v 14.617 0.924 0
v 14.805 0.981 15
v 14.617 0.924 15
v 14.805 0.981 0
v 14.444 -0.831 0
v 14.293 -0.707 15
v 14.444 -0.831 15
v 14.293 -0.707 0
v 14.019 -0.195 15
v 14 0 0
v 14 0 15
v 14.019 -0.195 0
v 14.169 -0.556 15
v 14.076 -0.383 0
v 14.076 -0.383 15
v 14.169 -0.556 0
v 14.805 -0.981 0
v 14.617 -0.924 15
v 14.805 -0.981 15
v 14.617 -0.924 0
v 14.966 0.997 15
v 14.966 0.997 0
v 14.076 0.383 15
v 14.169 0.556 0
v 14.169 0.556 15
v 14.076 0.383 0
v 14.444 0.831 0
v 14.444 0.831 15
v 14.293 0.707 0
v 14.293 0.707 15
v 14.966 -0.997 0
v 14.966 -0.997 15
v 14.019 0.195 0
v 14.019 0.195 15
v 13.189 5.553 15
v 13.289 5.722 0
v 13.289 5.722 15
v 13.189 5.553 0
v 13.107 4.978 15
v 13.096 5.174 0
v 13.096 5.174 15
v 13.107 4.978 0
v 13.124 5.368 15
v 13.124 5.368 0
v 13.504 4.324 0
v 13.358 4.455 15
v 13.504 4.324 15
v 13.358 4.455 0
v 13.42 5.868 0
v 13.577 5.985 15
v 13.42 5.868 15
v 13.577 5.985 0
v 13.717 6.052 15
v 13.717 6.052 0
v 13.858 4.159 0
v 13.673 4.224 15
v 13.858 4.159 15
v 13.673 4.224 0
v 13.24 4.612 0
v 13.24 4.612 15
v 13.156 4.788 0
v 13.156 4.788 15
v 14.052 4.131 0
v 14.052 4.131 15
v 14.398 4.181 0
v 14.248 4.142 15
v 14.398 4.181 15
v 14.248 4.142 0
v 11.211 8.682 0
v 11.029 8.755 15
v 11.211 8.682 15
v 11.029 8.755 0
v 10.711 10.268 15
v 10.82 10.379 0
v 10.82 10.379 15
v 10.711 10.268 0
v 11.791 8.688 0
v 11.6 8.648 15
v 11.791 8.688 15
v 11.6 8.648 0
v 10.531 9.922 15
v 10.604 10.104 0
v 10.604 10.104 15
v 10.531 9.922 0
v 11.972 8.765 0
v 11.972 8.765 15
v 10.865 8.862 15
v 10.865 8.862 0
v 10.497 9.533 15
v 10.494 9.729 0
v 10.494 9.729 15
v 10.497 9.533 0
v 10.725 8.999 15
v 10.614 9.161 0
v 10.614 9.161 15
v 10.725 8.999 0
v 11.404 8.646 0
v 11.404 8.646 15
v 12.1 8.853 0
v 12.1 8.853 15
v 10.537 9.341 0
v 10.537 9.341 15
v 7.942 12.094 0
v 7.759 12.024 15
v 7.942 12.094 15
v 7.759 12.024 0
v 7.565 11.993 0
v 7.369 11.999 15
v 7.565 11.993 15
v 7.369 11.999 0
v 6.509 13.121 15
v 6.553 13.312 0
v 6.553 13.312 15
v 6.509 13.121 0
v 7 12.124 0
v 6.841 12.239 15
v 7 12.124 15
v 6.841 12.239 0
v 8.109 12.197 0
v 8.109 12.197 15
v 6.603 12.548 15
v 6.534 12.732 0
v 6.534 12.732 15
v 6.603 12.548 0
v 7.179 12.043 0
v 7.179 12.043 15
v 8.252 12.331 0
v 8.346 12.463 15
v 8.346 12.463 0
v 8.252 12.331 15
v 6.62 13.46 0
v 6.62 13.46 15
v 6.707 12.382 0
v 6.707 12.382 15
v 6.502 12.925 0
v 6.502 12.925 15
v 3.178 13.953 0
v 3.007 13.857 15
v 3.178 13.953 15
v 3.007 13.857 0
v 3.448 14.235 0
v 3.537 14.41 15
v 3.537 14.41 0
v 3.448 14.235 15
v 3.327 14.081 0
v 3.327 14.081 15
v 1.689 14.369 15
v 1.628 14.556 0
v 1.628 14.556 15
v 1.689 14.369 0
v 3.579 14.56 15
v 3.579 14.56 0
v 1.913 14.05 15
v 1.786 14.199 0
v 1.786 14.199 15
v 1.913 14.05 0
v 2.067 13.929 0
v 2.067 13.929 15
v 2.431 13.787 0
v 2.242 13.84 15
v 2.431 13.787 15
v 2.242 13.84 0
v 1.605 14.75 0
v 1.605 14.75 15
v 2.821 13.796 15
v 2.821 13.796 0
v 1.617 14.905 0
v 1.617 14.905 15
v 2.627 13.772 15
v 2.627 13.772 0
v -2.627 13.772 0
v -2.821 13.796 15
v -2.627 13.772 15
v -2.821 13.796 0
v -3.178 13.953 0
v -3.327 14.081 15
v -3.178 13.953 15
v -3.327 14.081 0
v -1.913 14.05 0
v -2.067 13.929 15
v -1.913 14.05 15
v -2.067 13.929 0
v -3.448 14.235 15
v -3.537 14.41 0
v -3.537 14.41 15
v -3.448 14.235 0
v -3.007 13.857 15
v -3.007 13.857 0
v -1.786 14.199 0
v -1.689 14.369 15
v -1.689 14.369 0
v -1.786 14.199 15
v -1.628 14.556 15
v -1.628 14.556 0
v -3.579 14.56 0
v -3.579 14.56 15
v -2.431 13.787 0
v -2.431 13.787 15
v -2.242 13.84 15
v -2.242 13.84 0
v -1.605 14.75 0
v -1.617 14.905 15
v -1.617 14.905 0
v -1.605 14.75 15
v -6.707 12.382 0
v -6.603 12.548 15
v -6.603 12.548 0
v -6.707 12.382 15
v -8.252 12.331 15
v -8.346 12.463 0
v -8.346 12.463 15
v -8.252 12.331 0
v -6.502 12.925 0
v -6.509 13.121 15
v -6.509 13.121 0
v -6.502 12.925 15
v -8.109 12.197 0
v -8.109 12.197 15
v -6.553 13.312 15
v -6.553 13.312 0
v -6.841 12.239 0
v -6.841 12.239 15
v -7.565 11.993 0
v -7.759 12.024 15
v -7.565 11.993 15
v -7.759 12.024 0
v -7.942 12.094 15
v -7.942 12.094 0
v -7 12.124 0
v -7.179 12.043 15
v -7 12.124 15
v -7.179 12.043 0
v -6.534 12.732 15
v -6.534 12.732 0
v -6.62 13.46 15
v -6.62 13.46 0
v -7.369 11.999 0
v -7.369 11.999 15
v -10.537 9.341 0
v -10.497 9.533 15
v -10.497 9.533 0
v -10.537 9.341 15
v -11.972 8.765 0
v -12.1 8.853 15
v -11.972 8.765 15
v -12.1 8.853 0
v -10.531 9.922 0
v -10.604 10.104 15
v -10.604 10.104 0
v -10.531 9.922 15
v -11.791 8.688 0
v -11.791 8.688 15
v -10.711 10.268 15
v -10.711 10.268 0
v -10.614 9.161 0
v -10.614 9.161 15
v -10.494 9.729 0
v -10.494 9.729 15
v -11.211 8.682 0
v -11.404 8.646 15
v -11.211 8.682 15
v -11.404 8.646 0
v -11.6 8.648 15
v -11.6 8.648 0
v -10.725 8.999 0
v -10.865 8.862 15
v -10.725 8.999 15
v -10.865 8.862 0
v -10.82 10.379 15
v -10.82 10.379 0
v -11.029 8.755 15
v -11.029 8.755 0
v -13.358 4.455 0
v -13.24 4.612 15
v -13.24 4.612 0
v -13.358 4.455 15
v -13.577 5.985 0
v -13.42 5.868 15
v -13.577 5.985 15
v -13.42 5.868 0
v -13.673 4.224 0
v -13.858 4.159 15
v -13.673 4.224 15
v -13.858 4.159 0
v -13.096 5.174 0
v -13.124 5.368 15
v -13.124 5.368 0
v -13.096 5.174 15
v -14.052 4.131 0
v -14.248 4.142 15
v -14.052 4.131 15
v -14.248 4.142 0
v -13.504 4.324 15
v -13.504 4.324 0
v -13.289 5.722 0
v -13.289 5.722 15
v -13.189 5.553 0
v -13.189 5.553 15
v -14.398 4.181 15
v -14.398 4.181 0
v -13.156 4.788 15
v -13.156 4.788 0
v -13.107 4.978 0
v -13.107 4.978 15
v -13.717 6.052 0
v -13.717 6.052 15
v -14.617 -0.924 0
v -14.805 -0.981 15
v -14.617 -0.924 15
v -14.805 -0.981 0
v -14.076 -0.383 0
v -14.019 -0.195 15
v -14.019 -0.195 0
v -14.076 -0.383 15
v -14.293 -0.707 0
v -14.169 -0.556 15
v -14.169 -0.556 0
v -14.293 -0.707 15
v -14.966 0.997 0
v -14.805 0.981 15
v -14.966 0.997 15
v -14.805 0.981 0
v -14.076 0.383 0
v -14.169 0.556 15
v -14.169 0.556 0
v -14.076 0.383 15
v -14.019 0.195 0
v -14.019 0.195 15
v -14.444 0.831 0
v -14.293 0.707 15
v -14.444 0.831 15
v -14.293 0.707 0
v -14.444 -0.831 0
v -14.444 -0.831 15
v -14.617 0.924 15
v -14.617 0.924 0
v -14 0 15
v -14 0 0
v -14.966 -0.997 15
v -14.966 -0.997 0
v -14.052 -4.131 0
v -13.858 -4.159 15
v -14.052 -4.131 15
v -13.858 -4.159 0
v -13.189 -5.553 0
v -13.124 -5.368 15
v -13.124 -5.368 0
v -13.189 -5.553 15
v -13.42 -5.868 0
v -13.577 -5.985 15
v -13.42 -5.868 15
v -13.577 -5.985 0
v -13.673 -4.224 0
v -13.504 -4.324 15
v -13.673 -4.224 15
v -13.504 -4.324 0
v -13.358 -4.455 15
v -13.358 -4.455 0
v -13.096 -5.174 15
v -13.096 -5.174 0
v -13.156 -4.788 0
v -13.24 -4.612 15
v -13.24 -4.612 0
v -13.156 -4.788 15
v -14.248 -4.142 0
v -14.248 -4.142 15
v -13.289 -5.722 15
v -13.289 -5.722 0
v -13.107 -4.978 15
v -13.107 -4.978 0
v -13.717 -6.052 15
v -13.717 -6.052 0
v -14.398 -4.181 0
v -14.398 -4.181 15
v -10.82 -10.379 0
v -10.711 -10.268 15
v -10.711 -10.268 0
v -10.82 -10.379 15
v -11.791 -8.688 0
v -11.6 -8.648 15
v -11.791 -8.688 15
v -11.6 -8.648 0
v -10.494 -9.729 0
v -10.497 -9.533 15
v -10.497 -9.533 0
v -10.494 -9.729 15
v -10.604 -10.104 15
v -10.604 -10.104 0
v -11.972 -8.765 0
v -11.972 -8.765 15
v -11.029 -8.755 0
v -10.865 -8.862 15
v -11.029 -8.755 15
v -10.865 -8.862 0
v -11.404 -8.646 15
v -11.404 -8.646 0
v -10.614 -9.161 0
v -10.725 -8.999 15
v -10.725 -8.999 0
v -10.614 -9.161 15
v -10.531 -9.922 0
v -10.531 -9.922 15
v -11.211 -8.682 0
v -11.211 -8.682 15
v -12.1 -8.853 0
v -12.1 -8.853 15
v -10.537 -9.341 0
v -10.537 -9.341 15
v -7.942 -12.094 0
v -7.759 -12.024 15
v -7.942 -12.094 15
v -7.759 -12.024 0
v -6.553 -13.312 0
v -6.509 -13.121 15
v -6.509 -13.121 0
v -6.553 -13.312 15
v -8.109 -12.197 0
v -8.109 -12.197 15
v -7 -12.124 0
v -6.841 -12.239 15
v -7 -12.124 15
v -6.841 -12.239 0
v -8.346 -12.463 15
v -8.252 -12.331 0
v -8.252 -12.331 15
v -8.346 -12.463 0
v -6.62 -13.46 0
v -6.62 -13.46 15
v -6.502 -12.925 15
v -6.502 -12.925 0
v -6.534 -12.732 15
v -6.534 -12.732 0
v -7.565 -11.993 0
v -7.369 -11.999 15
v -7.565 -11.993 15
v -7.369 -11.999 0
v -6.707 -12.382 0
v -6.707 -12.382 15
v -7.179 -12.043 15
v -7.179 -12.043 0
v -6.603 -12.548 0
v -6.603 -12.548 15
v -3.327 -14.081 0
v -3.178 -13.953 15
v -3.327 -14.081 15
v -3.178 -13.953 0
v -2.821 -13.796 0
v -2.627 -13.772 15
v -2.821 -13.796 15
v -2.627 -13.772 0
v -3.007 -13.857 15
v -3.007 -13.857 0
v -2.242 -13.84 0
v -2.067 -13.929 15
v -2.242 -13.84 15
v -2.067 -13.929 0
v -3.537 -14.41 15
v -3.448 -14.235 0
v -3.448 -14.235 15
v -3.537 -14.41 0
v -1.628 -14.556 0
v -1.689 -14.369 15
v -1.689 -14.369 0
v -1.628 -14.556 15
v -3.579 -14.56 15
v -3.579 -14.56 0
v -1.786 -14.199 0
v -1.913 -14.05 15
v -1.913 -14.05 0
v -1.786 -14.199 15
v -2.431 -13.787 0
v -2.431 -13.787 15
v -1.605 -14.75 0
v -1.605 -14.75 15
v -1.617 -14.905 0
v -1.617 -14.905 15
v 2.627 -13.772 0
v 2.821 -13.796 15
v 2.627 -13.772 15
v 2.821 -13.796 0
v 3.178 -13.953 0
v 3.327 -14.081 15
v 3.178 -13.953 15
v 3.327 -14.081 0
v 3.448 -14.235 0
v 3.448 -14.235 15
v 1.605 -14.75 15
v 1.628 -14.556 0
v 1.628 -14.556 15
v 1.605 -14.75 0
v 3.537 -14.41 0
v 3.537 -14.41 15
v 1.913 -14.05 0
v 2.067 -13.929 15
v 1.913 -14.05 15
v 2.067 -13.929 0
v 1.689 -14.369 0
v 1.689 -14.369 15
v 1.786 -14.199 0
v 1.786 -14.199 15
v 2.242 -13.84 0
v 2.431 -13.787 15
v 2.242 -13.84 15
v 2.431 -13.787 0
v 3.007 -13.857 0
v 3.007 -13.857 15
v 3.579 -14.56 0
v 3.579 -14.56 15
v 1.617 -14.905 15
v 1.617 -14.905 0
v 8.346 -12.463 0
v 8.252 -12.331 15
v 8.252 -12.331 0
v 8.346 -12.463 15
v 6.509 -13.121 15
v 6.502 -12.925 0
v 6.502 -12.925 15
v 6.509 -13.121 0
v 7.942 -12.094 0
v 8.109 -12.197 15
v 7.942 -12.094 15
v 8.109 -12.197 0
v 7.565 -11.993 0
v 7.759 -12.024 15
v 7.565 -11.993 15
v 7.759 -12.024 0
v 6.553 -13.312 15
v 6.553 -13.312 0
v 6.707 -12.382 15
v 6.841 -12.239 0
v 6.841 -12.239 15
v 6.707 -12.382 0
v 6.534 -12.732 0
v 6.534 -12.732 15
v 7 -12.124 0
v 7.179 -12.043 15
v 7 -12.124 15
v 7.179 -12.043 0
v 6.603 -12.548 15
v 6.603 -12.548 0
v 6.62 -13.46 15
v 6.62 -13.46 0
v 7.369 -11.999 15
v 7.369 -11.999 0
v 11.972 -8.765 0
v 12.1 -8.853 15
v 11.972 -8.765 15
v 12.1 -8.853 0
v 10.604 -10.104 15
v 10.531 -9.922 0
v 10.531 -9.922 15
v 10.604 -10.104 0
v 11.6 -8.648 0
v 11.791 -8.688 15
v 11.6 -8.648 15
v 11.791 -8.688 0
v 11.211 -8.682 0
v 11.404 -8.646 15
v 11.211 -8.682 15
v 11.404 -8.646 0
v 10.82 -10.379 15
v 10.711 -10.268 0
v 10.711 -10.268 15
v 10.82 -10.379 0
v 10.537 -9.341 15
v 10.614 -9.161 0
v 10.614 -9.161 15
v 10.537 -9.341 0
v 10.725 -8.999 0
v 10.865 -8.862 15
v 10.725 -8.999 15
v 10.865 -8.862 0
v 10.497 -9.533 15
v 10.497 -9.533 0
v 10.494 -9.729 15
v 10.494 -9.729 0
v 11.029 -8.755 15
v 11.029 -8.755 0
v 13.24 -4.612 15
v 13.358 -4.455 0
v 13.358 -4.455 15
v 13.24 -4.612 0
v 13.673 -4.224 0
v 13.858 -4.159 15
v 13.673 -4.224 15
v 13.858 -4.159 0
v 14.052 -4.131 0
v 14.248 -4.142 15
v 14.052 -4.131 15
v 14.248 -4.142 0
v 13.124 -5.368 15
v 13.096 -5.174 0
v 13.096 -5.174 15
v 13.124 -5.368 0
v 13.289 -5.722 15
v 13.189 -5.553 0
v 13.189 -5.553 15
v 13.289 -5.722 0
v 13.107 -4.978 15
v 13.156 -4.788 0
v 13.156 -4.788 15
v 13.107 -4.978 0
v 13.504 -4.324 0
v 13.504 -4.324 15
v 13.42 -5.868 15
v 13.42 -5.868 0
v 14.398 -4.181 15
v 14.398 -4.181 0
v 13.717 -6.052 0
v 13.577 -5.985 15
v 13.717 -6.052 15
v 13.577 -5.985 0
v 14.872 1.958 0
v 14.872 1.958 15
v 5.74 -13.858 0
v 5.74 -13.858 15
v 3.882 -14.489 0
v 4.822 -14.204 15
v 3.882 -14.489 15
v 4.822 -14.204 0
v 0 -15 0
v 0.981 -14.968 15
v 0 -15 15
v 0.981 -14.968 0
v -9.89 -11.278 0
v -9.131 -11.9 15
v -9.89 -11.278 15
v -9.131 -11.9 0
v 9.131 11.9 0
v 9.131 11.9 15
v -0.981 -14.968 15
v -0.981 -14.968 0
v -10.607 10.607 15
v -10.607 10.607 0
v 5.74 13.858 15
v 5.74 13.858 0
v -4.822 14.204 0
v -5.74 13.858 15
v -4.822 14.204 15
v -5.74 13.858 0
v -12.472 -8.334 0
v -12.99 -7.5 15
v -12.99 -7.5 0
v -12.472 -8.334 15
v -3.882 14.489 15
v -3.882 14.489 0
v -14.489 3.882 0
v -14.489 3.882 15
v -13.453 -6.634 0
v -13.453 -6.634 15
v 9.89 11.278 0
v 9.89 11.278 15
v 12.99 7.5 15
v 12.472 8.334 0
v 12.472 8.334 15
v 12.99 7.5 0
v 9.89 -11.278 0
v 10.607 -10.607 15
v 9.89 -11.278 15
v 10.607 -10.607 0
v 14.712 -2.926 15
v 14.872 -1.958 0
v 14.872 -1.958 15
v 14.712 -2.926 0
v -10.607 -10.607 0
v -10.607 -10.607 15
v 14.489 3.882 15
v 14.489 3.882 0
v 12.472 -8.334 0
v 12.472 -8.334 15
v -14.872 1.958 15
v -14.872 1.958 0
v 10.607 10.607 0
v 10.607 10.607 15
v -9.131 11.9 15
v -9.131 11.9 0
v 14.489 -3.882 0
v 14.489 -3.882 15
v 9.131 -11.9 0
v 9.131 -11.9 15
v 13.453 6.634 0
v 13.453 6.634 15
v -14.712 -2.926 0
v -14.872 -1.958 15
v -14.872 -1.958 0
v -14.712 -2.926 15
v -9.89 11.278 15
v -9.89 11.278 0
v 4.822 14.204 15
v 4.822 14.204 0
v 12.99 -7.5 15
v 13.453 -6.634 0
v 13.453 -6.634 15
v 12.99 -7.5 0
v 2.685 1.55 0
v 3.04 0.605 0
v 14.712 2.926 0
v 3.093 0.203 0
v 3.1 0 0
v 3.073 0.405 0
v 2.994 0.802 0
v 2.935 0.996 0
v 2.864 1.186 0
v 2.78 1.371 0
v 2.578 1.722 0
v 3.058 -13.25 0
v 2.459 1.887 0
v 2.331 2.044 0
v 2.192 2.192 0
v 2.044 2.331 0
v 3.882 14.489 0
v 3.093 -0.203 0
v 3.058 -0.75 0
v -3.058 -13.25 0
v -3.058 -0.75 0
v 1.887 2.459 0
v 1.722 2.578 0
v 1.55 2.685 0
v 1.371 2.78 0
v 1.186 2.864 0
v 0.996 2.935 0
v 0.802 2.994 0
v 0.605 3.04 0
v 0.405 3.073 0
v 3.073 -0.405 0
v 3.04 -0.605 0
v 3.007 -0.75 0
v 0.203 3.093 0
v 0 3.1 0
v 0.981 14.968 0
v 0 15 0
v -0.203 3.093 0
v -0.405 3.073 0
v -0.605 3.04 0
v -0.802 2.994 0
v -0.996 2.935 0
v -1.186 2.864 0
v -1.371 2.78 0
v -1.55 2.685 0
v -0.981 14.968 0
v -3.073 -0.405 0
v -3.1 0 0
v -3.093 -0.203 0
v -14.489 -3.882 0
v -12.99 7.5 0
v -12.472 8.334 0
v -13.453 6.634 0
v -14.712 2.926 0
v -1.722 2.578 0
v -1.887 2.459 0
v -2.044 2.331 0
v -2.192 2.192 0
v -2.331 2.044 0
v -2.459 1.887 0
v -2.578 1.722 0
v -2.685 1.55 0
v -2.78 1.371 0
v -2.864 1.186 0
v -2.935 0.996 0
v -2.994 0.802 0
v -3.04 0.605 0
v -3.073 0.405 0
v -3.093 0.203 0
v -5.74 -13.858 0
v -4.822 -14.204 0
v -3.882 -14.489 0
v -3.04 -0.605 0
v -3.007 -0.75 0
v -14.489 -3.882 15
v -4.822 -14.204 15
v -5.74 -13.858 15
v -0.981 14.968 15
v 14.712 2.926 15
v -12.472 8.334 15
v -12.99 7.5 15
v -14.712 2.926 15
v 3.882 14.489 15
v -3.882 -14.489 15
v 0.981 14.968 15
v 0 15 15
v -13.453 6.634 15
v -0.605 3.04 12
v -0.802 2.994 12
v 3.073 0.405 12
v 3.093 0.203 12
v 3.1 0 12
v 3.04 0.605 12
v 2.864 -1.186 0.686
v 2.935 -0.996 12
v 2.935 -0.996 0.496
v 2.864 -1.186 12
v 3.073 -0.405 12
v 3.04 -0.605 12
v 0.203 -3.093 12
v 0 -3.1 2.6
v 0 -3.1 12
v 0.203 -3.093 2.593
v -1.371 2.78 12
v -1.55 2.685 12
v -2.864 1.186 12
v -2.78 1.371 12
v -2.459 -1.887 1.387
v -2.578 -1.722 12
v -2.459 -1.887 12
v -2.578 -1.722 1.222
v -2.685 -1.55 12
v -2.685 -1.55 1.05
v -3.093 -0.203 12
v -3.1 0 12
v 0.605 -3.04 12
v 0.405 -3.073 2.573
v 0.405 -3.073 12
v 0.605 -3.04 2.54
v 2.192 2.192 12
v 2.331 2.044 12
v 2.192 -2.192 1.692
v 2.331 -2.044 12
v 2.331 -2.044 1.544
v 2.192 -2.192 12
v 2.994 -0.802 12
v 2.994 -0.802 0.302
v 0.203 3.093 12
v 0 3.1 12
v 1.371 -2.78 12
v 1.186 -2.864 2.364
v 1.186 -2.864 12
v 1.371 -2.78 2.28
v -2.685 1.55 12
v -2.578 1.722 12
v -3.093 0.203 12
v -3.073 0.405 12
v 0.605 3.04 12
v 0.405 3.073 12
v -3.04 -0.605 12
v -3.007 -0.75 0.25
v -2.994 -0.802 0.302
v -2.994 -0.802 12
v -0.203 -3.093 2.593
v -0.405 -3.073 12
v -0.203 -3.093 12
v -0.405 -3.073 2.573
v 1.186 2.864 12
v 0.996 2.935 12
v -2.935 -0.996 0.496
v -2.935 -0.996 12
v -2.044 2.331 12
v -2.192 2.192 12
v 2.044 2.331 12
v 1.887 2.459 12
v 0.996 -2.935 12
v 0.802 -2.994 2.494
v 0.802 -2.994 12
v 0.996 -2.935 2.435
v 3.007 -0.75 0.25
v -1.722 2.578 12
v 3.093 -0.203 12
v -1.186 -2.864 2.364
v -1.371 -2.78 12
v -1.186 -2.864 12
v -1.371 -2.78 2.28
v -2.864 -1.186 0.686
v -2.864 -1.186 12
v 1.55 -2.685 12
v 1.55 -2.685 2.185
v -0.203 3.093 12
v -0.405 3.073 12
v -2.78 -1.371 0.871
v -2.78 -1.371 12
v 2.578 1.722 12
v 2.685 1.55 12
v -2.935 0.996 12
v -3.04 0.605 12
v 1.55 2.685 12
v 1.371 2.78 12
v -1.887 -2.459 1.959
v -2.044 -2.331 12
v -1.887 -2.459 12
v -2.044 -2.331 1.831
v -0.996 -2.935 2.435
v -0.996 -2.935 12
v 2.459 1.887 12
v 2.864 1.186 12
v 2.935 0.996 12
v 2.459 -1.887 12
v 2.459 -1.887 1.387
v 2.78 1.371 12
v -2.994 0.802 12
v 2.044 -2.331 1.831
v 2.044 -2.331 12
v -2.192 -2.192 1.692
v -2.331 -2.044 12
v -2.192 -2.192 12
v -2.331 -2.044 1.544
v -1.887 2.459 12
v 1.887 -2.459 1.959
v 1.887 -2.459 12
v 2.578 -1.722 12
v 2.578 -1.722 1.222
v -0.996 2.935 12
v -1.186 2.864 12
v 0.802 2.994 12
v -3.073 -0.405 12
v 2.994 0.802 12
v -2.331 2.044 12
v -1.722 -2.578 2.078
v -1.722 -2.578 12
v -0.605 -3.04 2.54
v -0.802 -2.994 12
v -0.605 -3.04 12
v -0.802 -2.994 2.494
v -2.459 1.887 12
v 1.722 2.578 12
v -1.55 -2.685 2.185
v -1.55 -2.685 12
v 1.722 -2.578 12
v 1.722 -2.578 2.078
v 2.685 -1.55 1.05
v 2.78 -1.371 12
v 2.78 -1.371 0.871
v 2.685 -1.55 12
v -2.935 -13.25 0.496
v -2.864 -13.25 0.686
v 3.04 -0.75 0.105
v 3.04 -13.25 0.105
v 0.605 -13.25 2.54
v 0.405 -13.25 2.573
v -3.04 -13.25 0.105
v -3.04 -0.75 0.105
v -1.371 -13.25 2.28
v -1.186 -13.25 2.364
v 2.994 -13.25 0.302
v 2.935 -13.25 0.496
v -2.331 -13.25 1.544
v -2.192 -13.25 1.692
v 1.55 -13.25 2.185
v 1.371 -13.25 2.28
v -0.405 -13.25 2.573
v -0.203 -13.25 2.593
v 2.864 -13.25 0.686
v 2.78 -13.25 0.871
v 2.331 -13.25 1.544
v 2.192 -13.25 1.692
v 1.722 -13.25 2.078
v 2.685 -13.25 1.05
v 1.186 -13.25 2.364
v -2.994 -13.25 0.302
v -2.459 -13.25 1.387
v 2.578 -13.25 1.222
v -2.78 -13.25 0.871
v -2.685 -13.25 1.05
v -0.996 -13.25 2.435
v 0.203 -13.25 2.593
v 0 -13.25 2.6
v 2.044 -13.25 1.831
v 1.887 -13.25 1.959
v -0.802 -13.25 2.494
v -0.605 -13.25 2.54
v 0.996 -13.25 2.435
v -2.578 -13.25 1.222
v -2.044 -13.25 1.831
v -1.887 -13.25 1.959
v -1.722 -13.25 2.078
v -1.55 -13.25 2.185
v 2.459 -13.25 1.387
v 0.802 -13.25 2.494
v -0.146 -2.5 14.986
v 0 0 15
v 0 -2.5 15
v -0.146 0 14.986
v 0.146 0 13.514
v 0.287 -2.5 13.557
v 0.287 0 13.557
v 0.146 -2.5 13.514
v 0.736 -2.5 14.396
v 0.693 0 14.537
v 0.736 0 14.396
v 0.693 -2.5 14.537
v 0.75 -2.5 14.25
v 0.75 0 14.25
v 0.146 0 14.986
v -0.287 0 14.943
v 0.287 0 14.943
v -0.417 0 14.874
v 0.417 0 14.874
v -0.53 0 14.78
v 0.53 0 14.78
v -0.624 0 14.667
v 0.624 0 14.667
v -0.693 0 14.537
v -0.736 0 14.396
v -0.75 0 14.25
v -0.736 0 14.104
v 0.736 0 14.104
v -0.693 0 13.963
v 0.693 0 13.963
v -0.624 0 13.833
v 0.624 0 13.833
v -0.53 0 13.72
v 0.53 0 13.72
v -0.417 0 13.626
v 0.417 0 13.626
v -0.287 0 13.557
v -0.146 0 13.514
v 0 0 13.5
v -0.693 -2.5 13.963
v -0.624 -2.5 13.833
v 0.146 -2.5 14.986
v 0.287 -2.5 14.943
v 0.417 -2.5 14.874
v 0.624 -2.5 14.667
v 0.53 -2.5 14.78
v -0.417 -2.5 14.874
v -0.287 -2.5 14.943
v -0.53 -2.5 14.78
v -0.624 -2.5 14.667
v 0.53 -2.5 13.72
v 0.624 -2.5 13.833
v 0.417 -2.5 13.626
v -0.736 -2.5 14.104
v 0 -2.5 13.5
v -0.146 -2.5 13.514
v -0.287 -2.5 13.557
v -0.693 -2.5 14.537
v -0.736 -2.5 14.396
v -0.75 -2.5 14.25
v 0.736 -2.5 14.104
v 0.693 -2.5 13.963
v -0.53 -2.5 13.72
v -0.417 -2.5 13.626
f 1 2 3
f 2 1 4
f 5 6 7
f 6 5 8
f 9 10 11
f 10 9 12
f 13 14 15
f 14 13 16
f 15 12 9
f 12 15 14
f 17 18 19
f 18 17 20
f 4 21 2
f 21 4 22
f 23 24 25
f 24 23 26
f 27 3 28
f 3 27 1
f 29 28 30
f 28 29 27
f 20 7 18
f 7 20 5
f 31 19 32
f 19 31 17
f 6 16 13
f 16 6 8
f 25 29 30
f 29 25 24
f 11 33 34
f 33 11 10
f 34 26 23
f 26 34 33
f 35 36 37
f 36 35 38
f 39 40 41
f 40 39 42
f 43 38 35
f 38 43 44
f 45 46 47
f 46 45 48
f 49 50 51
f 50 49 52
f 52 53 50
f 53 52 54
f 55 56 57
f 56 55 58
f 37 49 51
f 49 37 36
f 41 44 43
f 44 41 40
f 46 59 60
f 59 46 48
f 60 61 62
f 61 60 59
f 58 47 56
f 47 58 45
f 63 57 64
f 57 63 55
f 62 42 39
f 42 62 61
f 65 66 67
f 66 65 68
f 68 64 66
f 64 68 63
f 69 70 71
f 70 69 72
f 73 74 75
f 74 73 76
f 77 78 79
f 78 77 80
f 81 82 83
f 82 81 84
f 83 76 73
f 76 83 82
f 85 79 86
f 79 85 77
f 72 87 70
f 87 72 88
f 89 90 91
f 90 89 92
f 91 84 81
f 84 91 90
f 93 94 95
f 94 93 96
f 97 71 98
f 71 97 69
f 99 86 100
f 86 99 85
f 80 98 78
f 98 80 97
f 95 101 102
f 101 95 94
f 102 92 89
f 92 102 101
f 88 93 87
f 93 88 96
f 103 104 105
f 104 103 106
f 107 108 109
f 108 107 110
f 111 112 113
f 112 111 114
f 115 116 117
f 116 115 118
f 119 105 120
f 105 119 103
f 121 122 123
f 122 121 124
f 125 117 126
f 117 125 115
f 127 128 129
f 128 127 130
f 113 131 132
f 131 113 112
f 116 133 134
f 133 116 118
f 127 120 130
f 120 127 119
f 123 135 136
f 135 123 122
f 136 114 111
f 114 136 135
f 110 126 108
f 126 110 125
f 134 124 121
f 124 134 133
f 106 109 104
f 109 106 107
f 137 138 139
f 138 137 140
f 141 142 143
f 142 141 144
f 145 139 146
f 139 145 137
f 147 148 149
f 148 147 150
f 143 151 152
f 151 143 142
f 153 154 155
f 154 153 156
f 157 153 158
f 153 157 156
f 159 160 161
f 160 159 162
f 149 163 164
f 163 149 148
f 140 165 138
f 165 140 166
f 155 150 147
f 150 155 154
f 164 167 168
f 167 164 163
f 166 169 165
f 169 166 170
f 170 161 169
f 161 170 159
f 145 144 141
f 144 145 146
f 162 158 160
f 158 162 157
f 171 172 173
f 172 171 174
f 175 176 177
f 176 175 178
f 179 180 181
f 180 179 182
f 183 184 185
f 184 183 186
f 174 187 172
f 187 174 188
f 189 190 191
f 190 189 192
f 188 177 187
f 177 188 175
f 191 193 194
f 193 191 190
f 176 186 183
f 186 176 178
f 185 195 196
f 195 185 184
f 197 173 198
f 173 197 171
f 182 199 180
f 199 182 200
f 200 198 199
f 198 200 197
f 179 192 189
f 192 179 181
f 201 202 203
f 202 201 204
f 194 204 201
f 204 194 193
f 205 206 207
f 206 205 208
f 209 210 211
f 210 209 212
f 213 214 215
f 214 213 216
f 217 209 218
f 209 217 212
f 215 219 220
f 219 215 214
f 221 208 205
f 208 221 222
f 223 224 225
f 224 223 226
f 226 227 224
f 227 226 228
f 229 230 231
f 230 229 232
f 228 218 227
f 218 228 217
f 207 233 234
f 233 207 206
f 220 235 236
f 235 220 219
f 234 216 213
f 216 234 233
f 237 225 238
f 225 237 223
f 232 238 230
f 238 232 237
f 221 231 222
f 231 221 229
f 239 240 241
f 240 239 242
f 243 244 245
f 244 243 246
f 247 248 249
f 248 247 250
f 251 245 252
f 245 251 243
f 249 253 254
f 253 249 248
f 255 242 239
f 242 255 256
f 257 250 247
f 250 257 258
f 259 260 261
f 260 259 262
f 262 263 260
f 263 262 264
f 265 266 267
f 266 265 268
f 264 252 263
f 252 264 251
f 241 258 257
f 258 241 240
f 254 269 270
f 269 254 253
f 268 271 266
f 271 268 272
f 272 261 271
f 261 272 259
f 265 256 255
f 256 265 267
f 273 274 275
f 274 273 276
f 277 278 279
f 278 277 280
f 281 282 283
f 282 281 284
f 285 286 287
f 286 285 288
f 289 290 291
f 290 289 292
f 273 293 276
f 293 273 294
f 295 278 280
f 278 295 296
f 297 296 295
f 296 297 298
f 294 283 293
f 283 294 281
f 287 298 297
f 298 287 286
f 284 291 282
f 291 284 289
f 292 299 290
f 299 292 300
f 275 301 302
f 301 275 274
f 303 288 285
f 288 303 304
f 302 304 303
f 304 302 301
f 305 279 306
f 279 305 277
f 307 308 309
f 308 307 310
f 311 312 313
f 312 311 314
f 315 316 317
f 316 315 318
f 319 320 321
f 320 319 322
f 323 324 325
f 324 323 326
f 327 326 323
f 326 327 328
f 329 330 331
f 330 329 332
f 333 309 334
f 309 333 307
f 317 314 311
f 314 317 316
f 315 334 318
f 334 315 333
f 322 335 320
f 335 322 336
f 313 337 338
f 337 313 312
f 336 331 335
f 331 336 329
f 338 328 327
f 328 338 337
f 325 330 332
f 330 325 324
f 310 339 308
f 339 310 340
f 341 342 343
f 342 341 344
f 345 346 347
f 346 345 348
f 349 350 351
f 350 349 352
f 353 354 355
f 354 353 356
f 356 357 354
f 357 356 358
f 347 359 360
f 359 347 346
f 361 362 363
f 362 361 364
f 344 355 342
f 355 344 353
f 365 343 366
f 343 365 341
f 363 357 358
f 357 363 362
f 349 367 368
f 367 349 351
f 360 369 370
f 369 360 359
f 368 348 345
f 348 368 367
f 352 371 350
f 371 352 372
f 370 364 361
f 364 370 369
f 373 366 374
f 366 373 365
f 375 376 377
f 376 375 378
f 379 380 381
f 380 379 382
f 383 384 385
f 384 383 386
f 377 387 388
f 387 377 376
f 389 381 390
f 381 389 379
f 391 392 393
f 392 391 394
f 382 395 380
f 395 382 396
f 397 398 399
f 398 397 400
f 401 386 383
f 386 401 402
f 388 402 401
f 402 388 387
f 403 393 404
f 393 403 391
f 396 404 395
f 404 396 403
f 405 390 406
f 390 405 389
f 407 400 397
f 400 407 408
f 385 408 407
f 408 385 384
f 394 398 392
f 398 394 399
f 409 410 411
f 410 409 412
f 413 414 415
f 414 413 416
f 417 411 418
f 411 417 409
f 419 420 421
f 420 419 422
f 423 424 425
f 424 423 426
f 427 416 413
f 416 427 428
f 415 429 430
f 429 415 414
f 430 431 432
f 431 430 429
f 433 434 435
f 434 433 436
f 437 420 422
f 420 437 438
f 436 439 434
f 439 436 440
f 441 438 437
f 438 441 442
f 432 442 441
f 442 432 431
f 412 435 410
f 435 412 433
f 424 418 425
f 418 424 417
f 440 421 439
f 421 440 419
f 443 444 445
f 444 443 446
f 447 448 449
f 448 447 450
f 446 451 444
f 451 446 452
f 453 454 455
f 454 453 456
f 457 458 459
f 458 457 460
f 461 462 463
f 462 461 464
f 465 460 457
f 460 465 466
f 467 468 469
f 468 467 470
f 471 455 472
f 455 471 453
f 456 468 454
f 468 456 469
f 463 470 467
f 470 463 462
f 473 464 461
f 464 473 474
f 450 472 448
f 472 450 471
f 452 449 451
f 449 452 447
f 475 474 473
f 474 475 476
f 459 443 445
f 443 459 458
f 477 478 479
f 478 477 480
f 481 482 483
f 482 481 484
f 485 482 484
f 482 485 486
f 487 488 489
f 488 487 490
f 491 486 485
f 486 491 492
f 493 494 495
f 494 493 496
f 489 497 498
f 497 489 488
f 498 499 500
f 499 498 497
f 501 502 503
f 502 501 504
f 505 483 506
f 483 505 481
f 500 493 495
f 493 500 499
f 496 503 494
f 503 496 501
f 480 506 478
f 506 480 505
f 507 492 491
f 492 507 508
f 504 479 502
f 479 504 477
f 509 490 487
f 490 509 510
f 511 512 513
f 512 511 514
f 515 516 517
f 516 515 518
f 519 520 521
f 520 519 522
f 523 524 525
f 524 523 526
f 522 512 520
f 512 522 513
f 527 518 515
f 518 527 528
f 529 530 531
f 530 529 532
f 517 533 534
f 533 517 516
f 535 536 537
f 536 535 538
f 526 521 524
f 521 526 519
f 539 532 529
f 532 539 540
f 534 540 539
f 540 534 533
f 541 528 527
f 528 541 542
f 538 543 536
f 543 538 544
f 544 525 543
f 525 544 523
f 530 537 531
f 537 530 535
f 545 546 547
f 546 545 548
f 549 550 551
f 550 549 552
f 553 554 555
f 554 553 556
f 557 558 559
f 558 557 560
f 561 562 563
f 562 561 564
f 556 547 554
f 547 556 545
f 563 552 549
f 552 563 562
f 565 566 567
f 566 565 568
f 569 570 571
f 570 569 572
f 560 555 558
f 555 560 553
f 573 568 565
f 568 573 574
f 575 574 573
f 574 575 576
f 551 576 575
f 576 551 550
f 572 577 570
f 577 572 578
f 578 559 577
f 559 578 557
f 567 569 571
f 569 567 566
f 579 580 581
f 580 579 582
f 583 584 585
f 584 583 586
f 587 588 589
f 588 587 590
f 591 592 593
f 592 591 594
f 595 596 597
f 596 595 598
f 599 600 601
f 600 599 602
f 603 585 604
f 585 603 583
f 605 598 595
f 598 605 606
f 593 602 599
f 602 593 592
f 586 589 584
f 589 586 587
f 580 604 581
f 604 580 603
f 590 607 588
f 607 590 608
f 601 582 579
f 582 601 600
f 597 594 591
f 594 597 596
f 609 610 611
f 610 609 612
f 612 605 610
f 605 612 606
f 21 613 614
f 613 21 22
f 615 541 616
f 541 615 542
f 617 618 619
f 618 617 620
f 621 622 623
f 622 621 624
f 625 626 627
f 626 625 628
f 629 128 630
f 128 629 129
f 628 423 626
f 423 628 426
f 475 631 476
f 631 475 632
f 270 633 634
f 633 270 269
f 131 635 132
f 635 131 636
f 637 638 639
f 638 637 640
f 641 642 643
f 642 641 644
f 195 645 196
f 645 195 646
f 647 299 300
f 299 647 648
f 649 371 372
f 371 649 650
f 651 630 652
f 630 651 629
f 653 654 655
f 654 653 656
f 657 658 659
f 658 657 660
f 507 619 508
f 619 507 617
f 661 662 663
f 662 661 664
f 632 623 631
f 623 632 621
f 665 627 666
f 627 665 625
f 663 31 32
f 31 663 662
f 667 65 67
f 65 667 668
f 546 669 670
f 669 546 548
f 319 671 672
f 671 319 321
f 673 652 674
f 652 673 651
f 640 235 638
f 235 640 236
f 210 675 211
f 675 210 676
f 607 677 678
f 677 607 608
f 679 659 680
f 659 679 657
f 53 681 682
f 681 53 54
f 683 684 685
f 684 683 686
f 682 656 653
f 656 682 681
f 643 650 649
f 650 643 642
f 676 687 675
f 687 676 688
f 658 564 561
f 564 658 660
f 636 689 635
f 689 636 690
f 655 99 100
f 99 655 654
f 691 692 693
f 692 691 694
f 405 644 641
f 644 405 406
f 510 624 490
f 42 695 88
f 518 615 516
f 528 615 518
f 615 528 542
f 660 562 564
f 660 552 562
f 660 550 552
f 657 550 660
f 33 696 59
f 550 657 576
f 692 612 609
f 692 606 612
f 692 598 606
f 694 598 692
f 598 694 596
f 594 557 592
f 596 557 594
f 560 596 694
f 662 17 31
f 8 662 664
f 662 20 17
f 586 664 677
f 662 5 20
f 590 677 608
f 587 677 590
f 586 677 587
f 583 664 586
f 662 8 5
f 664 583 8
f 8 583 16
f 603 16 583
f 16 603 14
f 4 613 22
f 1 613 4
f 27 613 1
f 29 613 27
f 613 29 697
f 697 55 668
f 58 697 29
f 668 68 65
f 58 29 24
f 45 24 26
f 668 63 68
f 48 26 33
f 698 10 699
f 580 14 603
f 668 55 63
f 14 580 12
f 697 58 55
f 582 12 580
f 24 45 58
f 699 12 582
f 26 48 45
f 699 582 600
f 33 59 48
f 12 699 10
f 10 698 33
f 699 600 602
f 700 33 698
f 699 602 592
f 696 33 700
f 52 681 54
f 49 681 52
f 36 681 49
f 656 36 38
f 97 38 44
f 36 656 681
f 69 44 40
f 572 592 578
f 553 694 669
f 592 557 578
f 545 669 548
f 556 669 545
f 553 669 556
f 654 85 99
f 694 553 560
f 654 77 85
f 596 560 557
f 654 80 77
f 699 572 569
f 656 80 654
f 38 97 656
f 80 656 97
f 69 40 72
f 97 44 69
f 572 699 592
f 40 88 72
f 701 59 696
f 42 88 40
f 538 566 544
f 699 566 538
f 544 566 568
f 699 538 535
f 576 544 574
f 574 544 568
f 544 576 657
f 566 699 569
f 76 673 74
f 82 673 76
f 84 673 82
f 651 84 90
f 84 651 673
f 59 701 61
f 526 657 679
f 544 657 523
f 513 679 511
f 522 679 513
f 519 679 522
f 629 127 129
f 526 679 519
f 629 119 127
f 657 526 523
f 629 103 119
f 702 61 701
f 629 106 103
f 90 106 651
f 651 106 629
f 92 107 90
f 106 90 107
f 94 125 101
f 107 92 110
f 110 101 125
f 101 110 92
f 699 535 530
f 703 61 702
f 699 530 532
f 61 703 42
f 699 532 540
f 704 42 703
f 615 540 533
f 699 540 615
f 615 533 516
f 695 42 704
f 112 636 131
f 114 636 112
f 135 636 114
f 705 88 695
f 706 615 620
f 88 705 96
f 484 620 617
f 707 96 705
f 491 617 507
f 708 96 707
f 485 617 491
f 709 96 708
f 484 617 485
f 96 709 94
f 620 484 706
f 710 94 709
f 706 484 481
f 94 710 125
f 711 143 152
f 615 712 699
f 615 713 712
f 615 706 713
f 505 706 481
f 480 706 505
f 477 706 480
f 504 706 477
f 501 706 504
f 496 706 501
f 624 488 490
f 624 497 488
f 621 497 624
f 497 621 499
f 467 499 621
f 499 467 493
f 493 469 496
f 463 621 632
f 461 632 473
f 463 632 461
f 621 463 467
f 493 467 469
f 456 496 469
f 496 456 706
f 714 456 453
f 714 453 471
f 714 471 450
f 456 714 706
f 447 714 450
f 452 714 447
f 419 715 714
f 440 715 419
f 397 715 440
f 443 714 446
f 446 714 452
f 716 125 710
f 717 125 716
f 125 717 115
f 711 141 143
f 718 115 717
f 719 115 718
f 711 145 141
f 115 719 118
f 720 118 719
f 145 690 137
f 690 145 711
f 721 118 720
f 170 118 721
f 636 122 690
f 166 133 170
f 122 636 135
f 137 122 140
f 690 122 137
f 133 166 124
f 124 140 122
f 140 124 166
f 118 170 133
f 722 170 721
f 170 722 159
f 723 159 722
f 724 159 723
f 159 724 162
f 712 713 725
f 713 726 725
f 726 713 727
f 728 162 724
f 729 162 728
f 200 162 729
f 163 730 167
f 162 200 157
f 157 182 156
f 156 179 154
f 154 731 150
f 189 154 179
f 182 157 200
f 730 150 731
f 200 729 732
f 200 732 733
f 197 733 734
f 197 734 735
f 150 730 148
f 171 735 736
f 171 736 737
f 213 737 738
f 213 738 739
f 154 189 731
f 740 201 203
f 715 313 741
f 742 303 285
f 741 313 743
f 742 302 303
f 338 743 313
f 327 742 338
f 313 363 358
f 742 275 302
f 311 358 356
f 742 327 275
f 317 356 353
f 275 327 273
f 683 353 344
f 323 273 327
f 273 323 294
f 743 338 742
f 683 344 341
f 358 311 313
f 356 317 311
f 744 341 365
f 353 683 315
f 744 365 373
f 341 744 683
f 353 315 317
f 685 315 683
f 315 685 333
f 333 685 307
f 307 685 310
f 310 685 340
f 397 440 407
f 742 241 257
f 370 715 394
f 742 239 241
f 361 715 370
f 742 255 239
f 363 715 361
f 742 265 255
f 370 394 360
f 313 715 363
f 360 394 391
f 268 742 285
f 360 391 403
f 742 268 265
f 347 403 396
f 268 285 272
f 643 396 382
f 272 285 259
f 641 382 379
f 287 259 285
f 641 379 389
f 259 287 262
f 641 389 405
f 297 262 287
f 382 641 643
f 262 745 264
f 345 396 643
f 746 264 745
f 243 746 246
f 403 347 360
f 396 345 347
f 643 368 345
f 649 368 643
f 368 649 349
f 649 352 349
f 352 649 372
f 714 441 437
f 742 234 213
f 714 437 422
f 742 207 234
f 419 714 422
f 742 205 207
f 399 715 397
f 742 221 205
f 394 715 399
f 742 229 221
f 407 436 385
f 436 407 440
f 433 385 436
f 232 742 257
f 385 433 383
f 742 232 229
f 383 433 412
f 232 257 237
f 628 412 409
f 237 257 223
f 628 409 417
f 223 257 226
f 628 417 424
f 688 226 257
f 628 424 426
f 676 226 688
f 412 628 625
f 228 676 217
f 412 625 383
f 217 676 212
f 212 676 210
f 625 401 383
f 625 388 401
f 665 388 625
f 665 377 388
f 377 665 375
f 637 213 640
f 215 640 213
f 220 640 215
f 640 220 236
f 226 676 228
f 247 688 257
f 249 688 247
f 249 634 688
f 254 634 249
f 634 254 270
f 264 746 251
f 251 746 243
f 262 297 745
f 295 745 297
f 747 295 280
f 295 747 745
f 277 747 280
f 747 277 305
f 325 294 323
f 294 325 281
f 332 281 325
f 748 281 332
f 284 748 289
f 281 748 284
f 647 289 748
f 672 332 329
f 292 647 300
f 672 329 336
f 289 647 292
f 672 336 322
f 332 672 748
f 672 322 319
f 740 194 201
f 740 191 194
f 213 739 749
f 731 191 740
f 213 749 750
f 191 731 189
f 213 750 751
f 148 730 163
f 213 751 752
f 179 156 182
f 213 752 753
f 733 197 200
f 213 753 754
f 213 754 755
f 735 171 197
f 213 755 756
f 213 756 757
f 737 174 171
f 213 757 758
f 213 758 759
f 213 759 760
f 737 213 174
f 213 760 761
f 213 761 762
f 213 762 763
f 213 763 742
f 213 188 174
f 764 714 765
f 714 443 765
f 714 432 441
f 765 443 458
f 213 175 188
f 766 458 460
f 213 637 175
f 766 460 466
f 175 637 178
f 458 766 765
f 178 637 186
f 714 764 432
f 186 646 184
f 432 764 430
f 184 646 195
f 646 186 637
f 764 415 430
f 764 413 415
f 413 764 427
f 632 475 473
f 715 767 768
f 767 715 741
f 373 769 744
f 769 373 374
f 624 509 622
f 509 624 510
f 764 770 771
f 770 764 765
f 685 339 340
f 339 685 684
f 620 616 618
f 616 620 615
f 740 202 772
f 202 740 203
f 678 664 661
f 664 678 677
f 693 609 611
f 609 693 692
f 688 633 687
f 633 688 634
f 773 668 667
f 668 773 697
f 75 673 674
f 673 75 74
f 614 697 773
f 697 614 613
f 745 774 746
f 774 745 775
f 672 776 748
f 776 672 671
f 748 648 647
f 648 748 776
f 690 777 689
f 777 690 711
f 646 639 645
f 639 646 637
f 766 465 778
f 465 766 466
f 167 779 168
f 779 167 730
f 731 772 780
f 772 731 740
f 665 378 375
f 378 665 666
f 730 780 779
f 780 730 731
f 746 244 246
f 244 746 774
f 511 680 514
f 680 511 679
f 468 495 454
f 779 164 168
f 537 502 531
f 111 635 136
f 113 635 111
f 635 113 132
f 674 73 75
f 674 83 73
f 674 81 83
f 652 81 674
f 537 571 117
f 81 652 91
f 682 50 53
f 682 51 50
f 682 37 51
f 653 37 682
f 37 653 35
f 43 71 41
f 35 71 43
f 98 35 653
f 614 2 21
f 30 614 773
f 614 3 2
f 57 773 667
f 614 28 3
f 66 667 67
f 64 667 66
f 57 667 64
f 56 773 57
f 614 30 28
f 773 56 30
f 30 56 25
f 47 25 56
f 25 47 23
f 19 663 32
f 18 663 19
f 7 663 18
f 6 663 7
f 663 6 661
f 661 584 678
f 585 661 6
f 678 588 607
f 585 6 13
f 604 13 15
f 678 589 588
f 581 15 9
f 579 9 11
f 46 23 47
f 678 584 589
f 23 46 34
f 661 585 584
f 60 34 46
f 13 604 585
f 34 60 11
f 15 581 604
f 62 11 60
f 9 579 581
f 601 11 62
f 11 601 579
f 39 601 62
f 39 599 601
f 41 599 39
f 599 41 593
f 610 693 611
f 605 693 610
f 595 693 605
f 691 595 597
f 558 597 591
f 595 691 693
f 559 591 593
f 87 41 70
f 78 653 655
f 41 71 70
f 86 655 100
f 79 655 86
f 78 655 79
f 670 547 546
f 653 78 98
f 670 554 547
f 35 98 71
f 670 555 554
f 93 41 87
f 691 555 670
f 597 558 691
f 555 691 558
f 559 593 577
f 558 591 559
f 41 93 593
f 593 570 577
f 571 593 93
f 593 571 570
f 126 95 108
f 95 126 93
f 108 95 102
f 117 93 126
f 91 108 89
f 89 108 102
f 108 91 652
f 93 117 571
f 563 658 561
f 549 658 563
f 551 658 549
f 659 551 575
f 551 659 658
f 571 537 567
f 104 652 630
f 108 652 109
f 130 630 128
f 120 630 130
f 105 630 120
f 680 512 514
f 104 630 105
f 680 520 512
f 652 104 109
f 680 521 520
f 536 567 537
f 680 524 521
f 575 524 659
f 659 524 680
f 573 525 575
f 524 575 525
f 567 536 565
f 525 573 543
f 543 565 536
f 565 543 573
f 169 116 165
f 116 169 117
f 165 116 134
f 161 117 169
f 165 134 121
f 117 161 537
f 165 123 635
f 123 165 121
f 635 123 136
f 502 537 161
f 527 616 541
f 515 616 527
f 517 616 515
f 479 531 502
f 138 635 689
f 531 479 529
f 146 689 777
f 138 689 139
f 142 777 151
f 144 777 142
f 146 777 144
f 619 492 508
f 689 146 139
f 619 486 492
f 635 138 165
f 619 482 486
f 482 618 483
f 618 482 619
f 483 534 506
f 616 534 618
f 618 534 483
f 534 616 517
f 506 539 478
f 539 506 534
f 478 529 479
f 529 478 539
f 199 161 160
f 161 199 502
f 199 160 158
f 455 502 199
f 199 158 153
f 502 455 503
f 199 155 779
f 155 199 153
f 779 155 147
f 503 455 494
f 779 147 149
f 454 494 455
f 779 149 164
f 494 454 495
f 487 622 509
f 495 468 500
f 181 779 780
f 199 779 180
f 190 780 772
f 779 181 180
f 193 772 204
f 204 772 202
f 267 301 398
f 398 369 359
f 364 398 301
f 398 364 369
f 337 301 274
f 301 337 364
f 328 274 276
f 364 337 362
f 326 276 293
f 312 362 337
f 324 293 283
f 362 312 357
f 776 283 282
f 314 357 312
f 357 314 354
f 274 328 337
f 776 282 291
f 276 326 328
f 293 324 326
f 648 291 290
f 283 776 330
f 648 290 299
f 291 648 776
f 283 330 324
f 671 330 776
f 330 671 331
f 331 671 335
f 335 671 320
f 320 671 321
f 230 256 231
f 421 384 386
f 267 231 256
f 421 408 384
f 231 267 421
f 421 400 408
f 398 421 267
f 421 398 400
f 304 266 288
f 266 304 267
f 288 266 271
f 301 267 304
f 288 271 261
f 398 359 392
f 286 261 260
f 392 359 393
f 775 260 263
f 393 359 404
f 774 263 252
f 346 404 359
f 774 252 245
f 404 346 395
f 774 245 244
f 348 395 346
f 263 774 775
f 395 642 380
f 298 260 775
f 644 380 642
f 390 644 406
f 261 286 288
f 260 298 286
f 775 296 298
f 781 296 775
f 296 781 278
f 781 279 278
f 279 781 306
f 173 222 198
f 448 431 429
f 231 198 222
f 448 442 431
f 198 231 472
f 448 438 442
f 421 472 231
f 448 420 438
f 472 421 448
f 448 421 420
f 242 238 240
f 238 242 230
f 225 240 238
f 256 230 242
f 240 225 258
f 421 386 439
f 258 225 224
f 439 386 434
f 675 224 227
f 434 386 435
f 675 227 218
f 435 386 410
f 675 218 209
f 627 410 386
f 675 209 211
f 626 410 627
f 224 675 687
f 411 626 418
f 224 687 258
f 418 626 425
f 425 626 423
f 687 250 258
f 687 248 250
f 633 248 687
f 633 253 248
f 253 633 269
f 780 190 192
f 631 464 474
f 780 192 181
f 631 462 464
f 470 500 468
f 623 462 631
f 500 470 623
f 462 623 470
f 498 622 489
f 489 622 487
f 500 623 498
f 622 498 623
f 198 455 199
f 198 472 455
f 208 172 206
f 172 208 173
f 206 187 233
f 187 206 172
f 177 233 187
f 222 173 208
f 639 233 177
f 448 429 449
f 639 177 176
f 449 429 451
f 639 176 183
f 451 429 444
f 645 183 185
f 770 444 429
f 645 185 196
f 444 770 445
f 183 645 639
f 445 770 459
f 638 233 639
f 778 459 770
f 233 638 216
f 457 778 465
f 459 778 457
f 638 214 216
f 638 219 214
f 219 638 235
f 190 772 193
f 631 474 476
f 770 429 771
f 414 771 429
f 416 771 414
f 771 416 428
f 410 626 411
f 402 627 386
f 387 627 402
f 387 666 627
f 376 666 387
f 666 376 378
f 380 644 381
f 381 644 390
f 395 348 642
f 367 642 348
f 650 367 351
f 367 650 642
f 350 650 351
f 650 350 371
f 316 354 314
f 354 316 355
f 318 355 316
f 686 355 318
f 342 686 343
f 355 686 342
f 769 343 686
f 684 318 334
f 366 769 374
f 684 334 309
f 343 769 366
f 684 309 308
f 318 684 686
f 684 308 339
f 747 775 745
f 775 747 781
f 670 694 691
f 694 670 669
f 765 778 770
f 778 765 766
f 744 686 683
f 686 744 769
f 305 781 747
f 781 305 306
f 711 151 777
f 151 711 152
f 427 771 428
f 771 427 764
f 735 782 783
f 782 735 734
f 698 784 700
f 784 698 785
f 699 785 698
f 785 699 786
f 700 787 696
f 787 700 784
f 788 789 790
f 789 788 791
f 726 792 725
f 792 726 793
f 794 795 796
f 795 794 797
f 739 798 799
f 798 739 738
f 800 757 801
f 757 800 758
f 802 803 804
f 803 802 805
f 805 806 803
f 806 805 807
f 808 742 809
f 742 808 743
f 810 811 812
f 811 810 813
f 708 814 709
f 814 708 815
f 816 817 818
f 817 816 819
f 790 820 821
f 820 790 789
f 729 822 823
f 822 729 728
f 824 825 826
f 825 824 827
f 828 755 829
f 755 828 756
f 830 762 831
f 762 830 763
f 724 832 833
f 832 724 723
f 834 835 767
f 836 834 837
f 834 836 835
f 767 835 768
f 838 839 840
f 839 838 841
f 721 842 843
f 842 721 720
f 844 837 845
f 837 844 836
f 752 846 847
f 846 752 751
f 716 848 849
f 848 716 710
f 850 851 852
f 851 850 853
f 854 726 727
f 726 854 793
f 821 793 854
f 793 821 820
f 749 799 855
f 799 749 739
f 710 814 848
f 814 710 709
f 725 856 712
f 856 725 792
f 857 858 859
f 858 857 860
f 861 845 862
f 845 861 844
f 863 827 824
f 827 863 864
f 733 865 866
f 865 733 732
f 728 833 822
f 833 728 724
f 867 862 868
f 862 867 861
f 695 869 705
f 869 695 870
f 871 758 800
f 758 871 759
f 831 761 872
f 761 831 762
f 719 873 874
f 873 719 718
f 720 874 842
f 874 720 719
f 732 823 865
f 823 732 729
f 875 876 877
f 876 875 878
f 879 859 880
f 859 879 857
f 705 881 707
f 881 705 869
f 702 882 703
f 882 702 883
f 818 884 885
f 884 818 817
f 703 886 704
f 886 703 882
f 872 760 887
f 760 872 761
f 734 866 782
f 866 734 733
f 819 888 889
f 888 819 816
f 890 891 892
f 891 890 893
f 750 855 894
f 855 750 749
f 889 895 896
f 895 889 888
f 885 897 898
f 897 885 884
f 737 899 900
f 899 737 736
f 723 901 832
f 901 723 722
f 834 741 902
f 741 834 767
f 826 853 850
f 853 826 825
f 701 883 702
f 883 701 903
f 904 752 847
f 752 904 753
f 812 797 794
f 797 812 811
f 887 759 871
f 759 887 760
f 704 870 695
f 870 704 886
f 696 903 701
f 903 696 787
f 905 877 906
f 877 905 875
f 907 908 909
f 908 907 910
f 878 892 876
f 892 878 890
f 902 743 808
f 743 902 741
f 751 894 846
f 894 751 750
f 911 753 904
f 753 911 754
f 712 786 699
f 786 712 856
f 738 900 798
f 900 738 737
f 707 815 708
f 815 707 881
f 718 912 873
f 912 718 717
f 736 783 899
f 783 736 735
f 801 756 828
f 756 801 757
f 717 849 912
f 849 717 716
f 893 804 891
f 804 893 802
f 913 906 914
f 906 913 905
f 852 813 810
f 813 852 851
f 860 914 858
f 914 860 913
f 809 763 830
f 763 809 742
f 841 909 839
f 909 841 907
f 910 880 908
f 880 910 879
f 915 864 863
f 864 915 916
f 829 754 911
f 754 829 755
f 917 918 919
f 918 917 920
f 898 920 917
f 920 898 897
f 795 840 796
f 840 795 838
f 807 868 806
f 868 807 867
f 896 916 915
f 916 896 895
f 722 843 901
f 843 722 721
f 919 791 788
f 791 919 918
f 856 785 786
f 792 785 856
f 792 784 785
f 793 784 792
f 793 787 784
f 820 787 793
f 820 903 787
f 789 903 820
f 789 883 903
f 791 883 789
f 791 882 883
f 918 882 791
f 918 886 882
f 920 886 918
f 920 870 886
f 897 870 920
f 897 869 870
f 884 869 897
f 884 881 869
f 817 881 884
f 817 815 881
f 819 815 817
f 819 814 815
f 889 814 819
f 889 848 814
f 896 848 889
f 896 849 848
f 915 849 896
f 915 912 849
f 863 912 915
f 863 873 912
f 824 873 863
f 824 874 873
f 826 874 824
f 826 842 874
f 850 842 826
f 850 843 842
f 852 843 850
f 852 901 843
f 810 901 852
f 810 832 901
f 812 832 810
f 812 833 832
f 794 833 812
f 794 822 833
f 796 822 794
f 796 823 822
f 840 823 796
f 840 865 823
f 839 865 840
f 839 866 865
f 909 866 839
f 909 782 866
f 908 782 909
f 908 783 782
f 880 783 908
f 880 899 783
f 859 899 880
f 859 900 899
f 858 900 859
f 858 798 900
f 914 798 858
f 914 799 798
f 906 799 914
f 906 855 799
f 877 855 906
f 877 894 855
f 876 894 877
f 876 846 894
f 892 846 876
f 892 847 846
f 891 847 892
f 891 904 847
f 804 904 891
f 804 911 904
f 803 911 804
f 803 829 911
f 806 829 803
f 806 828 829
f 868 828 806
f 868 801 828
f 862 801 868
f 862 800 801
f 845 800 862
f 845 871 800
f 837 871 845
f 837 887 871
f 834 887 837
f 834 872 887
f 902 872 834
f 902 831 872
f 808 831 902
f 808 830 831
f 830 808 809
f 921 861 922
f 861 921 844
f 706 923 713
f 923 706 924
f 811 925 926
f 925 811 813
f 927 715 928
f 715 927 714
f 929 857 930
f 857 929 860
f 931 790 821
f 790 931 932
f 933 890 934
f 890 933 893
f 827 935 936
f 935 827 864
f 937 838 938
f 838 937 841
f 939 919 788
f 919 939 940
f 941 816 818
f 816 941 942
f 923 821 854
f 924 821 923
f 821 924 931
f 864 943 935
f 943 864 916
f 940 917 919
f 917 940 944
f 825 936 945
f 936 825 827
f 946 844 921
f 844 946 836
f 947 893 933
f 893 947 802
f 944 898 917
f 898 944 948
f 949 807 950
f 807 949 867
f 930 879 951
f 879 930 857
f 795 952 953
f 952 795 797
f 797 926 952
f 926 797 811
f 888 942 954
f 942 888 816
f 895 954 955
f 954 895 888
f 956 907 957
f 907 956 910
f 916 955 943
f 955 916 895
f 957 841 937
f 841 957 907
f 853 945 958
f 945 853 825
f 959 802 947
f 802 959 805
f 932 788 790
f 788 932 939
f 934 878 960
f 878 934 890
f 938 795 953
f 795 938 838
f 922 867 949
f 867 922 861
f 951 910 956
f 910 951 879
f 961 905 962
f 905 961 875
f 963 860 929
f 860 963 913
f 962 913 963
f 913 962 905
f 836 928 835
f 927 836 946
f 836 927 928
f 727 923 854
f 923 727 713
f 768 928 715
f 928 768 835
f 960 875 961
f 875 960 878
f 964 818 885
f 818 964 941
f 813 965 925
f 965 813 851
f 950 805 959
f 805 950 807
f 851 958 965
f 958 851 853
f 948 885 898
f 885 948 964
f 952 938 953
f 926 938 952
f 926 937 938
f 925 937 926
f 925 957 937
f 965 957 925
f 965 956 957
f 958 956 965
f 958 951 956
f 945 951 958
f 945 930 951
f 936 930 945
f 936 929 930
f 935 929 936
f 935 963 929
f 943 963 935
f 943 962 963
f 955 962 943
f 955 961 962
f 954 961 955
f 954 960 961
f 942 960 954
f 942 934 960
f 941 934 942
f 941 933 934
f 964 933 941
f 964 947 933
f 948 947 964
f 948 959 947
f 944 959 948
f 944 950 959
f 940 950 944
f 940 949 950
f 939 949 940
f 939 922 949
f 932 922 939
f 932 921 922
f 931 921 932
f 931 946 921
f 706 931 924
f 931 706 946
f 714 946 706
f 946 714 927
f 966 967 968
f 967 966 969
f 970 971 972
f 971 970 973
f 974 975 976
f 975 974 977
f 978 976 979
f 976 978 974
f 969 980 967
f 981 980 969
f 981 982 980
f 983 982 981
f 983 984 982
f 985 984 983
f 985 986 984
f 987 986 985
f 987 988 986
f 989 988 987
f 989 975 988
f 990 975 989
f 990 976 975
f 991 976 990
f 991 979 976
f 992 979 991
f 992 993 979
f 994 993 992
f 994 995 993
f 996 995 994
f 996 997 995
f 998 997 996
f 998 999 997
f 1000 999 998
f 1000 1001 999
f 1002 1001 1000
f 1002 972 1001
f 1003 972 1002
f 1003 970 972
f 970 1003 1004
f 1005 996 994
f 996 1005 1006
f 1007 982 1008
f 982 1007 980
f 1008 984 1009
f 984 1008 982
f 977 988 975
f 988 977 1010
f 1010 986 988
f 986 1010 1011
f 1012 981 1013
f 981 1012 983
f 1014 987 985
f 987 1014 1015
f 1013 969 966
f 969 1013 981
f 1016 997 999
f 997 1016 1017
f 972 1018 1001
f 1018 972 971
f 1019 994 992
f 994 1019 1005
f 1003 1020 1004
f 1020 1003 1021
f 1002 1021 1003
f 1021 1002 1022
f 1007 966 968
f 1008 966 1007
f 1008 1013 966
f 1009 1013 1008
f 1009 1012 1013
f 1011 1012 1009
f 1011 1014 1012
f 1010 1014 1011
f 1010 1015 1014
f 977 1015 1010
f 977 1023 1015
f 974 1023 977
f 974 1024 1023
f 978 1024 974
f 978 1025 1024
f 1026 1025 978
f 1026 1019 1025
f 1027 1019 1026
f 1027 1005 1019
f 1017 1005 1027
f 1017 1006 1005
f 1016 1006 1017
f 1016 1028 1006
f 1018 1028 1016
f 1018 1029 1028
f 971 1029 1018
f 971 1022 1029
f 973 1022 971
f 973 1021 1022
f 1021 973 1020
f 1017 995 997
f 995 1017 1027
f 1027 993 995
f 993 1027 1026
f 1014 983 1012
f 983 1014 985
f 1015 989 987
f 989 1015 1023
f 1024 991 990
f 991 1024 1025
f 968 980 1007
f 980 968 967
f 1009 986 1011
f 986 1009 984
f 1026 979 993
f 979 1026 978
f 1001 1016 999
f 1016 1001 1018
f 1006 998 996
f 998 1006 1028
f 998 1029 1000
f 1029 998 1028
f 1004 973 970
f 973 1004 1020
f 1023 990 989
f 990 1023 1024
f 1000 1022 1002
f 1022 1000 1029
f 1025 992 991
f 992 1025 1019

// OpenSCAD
// Hotplate stirrer knob - replacement part for D-shaft (6 mm)
// Print orientation: bottom face (with D-bore opening) on the bed at z = 0

$fn = 96;

// ---- Dimensions (mm) ----
knob_d        = 30;    // knob outer diameter
knob_h        = 15;    // knob height
shaft_d       = 6;     // D-shaft diameter
bore_d        = 6.2;   // D-blind bore diameter
bore_depth    = 12;    // bore depth from bottom face
bore_flat     = (bore_d - 4.7) / 2;  // offset of circle centre from flat side
groove_d      = 2;     // grip groove (half-cylinder) diameter
groove_count  = 18;    // number of evenly spaced grooves
groove_r      = groove_d / 2;          // groove radius
pointer_w     = 1.5;   // pointer groove width
pointer_d     = pointer_w / 2;         // pointer groove depth (half-cylinder)
eps           = 0.5;   // overcut for clean boolean differences

// ---- Model ----
difference() {
    // Main knob body
    cylinder(d = knob_d, h = knob_h);

    // D-shaped blind bore in bottom face
    translate([0, 0, -eps])
        cylinder(d = bore_d, h = bore_depth + eps);
    translate([0, -bore_flat, -eps])
        rotate([90, 0, 0])
            cylinder(d = bore_d, h = bore_depth + eps);

    // Vertical grip grooves along full height
    for (i = [0 : groove_count - 1])
        rotate([0, 0, i * 360 / groove_count])
            translate([knob_d / 2, 0, -eps])
                cylinder(r = groove_r, h = knob_h + 2 * eps, $fn = 32);

    // Pointer groove on top face, centred on +x axis
    translate([0, 0, knob_h - pointer_d])
        rotate([90, 0, 0])
            cylinder(r = pointer_d, h = pointer_w + 2 * eps, $fn = 32);
}
